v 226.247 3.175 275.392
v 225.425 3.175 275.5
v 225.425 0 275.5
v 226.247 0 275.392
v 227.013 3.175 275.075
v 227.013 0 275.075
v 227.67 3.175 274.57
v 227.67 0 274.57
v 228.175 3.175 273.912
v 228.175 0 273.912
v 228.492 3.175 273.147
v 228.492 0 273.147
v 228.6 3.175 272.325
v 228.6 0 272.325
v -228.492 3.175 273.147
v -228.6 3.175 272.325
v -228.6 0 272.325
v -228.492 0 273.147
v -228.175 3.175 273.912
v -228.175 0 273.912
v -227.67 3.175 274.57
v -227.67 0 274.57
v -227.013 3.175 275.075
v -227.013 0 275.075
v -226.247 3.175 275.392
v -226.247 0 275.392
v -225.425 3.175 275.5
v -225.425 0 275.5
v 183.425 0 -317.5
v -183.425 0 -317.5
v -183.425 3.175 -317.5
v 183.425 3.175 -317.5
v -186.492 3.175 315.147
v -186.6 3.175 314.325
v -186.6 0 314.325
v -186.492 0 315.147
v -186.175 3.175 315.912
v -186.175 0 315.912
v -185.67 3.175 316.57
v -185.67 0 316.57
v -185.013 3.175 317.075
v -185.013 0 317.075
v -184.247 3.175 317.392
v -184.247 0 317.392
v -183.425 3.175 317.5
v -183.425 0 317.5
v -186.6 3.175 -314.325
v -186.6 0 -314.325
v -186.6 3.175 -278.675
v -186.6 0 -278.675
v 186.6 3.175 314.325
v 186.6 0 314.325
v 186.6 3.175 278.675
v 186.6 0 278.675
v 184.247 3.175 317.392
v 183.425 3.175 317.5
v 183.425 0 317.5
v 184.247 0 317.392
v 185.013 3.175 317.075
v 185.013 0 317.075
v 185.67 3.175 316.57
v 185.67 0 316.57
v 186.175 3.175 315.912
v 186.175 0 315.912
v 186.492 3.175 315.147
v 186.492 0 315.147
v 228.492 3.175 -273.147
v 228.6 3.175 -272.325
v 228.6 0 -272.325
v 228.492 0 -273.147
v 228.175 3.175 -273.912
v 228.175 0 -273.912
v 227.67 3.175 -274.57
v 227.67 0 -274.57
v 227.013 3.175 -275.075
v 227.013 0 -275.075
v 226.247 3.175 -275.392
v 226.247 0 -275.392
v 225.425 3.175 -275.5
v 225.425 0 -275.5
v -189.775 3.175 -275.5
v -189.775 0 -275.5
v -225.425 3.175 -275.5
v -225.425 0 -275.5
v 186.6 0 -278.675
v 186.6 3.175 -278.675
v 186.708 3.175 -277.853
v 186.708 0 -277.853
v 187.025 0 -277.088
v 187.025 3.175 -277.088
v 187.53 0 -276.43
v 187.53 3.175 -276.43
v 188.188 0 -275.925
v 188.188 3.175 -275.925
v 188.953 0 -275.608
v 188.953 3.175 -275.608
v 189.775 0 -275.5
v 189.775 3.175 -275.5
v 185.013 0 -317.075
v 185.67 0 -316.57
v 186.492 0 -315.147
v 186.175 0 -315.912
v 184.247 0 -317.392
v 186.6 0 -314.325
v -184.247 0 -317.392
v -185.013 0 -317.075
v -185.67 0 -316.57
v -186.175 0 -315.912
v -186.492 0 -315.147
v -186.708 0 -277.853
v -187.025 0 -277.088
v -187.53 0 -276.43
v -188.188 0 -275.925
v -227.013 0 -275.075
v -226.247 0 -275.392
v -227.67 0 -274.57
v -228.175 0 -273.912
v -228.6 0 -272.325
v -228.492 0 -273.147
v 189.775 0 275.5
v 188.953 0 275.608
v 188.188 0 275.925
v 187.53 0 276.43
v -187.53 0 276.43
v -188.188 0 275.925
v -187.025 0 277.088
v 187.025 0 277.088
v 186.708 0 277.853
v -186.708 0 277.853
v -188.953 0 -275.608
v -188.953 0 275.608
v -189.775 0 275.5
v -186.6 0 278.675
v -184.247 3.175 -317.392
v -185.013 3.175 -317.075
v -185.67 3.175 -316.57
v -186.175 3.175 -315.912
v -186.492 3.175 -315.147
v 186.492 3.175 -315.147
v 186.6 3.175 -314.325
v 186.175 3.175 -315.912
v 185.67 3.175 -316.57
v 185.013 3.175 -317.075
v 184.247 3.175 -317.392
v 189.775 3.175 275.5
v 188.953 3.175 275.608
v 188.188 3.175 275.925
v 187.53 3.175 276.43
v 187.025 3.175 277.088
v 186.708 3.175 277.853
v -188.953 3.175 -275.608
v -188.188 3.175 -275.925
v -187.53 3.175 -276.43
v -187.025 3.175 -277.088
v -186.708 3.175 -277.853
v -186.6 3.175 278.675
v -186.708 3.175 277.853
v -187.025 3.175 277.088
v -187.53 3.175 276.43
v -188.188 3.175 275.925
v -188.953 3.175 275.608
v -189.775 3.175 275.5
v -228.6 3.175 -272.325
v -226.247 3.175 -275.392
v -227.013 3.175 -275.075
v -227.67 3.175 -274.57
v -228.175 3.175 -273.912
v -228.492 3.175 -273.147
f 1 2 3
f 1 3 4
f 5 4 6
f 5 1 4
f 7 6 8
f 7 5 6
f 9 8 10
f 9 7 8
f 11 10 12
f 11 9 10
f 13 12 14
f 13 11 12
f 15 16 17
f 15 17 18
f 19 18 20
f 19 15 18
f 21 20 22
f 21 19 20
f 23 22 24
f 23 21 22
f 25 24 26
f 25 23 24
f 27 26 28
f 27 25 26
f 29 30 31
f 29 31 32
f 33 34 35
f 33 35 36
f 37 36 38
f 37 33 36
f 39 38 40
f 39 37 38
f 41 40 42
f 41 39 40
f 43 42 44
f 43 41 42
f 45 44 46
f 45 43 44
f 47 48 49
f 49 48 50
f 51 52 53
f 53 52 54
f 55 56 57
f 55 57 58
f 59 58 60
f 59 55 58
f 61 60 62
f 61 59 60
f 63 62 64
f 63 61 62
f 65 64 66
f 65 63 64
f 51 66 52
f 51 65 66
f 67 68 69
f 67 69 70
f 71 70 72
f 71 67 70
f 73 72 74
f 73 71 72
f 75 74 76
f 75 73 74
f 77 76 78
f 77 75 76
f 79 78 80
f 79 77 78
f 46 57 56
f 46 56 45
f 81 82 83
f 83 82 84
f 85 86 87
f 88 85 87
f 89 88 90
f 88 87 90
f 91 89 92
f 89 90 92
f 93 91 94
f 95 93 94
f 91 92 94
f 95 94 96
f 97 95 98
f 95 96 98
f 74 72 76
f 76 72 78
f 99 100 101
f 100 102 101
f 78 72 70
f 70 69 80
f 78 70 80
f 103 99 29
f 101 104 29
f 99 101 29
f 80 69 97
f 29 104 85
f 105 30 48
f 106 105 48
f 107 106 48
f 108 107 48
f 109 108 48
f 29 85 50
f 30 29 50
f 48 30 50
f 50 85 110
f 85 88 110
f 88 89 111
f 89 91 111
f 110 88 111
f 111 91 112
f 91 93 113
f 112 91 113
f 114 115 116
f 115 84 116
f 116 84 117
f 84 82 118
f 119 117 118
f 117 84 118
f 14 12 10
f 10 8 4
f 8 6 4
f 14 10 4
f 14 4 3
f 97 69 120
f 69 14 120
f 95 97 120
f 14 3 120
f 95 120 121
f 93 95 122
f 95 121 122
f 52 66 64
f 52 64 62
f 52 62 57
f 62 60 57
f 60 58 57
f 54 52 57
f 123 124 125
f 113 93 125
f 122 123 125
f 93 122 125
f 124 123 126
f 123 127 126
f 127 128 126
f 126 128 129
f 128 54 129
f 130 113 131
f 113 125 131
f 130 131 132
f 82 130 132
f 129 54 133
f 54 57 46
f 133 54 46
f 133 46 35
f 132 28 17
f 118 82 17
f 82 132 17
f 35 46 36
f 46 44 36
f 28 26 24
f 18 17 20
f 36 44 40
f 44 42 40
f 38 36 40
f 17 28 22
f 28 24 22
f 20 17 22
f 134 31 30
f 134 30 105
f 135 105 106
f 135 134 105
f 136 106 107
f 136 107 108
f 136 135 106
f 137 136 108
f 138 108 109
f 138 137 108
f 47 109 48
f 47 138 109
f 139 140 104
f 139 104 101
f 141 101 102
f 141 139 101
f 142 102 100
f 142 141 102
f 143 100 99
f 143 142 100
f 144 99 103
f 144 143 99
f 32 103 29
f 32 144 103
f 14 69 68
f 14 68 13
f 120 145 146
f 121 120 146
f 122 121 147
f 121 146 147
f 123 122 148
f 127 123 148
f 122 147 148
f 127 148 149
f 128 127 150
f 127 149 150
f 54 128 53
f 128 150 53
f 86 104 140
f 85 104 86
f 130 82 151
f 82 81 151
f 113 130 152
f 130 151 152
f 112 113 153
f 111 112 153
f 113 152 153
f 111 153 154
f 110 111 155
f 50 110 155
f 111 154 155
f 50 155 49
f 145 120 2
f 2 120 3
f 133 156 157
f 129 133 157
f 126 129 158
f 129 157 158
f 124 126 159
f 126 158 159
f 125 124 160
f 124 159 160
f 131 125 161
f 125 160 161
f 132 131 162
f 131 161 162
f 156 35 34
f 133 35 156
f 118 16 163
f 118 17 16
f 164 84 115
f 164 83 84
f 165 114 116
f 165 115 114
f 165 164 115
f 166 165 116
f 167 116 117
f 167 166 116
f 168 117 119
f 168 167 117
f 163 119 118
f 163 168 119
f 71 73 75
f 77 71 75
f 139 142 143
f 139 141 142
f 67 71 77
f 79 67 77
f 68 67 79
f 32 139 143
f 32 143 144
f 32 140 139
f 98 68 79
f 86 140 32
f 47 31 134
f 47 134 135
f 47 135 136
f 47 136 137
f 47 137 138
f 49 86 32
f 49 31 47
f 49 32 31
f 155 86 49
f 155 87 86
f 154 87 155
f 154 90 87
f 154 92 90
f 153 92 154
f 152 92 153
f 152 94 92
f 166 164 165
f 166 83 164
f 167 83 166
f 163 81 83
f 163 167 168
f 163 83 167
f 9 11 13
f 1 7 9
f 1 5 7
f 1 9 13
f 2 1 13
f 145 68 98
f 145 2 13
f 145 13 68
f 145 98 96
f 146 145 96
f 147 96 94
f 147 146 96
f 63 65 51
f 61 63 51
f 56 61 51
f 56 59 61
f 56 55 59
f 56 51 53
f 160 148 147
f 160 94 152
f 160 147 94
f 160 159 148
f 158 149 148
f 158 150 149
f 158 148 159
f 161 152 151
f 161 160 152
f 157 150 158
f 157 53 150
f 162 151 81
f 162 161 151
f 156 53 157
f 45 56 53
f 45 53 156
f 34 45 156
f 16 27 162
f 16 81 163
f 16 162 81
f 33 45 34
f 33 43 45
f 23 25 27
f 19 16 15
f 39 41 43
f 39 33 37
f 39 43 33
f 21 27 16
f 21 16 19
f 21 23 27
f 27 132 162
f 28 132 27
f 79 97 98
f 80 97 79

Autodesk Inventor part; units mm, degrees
ref_plane "YZ Plane" through (0, 0, 0) normal (1, 0, 0) x (0, 1, 0)
ref_plane "XZ Plane" through (0, 0, 0) normal (0, 1, 0) x (-1, 0, 0)
ref_plane "XY Plane" through (0, 0, 0) normal (0, 0, 1) x (1, 0, 0)
sketch "Sketch1" plane through (0, 0, 0) normal (0, 1, 0) x (-1, 0, 0)
  line L0 (186.6, -317.5) -> (-186.6, -317.5)
  line L1 (-228.6, -275.5) -> (-228.6, 275.5)
  line L2 (-186.6, 317.5) -> (186.6, 317.5)
  line L3 (228.6, 275.5) -> (228.6, -275.5)
  line L4 (186.6, -317.5) -> (186.6, -275.5)
  line L5 (186.6, -275.5) -> (228.6, -275.5)
  line L6 (-186.6, -317.5) -> (-186.6, -275.5)
  line L7 (-186.6, -275.5) -> (-228.6, -275.5)
  line L8 (186.6, 317.5) -> (186.6, 275.5)
  line L9 (186.6, 275.5) -> (228.6, 275.5)
  line L10 (-186.6, 317.5) -> (-186.6, 275.5)
  line L11 (-186.6, 275.5) -> (-228.6, 275.5)
  point P0 (0, 0)
  dimension "d5" = 457.2
  dimension "d6" = 228.6
  dimension "d7" = 635
  dimension "d8" = 317.5
  dimension "d9" = 42
extrude "Extrusion1" add sketch "Sketch1" along normal blind 3.175
fillet "Fillet1" radius 3.175 12 edges at (186.6, 1.5875, -317.5) (186.6, 1.5875, -275.5) (228.6, 1.5875, -275.5) (-186.6, 1.5875, -317.5) (-186.6, 1.5875, -275.5) (-228.6, 1.5875, -275.5) (-228.6, 1.5875, 275.5) (-186.6, 1.5875, 275.5) (-186.6, 1.5875, 317.5) (186.6, 1.5875, 317.5) (186.6, 1.5875, 275.5) (228.6, 1.5875, 275.5)
equation "\"d6\" = 0.5 * d5"
equation "\"d8\" = 0.5 * d7"
